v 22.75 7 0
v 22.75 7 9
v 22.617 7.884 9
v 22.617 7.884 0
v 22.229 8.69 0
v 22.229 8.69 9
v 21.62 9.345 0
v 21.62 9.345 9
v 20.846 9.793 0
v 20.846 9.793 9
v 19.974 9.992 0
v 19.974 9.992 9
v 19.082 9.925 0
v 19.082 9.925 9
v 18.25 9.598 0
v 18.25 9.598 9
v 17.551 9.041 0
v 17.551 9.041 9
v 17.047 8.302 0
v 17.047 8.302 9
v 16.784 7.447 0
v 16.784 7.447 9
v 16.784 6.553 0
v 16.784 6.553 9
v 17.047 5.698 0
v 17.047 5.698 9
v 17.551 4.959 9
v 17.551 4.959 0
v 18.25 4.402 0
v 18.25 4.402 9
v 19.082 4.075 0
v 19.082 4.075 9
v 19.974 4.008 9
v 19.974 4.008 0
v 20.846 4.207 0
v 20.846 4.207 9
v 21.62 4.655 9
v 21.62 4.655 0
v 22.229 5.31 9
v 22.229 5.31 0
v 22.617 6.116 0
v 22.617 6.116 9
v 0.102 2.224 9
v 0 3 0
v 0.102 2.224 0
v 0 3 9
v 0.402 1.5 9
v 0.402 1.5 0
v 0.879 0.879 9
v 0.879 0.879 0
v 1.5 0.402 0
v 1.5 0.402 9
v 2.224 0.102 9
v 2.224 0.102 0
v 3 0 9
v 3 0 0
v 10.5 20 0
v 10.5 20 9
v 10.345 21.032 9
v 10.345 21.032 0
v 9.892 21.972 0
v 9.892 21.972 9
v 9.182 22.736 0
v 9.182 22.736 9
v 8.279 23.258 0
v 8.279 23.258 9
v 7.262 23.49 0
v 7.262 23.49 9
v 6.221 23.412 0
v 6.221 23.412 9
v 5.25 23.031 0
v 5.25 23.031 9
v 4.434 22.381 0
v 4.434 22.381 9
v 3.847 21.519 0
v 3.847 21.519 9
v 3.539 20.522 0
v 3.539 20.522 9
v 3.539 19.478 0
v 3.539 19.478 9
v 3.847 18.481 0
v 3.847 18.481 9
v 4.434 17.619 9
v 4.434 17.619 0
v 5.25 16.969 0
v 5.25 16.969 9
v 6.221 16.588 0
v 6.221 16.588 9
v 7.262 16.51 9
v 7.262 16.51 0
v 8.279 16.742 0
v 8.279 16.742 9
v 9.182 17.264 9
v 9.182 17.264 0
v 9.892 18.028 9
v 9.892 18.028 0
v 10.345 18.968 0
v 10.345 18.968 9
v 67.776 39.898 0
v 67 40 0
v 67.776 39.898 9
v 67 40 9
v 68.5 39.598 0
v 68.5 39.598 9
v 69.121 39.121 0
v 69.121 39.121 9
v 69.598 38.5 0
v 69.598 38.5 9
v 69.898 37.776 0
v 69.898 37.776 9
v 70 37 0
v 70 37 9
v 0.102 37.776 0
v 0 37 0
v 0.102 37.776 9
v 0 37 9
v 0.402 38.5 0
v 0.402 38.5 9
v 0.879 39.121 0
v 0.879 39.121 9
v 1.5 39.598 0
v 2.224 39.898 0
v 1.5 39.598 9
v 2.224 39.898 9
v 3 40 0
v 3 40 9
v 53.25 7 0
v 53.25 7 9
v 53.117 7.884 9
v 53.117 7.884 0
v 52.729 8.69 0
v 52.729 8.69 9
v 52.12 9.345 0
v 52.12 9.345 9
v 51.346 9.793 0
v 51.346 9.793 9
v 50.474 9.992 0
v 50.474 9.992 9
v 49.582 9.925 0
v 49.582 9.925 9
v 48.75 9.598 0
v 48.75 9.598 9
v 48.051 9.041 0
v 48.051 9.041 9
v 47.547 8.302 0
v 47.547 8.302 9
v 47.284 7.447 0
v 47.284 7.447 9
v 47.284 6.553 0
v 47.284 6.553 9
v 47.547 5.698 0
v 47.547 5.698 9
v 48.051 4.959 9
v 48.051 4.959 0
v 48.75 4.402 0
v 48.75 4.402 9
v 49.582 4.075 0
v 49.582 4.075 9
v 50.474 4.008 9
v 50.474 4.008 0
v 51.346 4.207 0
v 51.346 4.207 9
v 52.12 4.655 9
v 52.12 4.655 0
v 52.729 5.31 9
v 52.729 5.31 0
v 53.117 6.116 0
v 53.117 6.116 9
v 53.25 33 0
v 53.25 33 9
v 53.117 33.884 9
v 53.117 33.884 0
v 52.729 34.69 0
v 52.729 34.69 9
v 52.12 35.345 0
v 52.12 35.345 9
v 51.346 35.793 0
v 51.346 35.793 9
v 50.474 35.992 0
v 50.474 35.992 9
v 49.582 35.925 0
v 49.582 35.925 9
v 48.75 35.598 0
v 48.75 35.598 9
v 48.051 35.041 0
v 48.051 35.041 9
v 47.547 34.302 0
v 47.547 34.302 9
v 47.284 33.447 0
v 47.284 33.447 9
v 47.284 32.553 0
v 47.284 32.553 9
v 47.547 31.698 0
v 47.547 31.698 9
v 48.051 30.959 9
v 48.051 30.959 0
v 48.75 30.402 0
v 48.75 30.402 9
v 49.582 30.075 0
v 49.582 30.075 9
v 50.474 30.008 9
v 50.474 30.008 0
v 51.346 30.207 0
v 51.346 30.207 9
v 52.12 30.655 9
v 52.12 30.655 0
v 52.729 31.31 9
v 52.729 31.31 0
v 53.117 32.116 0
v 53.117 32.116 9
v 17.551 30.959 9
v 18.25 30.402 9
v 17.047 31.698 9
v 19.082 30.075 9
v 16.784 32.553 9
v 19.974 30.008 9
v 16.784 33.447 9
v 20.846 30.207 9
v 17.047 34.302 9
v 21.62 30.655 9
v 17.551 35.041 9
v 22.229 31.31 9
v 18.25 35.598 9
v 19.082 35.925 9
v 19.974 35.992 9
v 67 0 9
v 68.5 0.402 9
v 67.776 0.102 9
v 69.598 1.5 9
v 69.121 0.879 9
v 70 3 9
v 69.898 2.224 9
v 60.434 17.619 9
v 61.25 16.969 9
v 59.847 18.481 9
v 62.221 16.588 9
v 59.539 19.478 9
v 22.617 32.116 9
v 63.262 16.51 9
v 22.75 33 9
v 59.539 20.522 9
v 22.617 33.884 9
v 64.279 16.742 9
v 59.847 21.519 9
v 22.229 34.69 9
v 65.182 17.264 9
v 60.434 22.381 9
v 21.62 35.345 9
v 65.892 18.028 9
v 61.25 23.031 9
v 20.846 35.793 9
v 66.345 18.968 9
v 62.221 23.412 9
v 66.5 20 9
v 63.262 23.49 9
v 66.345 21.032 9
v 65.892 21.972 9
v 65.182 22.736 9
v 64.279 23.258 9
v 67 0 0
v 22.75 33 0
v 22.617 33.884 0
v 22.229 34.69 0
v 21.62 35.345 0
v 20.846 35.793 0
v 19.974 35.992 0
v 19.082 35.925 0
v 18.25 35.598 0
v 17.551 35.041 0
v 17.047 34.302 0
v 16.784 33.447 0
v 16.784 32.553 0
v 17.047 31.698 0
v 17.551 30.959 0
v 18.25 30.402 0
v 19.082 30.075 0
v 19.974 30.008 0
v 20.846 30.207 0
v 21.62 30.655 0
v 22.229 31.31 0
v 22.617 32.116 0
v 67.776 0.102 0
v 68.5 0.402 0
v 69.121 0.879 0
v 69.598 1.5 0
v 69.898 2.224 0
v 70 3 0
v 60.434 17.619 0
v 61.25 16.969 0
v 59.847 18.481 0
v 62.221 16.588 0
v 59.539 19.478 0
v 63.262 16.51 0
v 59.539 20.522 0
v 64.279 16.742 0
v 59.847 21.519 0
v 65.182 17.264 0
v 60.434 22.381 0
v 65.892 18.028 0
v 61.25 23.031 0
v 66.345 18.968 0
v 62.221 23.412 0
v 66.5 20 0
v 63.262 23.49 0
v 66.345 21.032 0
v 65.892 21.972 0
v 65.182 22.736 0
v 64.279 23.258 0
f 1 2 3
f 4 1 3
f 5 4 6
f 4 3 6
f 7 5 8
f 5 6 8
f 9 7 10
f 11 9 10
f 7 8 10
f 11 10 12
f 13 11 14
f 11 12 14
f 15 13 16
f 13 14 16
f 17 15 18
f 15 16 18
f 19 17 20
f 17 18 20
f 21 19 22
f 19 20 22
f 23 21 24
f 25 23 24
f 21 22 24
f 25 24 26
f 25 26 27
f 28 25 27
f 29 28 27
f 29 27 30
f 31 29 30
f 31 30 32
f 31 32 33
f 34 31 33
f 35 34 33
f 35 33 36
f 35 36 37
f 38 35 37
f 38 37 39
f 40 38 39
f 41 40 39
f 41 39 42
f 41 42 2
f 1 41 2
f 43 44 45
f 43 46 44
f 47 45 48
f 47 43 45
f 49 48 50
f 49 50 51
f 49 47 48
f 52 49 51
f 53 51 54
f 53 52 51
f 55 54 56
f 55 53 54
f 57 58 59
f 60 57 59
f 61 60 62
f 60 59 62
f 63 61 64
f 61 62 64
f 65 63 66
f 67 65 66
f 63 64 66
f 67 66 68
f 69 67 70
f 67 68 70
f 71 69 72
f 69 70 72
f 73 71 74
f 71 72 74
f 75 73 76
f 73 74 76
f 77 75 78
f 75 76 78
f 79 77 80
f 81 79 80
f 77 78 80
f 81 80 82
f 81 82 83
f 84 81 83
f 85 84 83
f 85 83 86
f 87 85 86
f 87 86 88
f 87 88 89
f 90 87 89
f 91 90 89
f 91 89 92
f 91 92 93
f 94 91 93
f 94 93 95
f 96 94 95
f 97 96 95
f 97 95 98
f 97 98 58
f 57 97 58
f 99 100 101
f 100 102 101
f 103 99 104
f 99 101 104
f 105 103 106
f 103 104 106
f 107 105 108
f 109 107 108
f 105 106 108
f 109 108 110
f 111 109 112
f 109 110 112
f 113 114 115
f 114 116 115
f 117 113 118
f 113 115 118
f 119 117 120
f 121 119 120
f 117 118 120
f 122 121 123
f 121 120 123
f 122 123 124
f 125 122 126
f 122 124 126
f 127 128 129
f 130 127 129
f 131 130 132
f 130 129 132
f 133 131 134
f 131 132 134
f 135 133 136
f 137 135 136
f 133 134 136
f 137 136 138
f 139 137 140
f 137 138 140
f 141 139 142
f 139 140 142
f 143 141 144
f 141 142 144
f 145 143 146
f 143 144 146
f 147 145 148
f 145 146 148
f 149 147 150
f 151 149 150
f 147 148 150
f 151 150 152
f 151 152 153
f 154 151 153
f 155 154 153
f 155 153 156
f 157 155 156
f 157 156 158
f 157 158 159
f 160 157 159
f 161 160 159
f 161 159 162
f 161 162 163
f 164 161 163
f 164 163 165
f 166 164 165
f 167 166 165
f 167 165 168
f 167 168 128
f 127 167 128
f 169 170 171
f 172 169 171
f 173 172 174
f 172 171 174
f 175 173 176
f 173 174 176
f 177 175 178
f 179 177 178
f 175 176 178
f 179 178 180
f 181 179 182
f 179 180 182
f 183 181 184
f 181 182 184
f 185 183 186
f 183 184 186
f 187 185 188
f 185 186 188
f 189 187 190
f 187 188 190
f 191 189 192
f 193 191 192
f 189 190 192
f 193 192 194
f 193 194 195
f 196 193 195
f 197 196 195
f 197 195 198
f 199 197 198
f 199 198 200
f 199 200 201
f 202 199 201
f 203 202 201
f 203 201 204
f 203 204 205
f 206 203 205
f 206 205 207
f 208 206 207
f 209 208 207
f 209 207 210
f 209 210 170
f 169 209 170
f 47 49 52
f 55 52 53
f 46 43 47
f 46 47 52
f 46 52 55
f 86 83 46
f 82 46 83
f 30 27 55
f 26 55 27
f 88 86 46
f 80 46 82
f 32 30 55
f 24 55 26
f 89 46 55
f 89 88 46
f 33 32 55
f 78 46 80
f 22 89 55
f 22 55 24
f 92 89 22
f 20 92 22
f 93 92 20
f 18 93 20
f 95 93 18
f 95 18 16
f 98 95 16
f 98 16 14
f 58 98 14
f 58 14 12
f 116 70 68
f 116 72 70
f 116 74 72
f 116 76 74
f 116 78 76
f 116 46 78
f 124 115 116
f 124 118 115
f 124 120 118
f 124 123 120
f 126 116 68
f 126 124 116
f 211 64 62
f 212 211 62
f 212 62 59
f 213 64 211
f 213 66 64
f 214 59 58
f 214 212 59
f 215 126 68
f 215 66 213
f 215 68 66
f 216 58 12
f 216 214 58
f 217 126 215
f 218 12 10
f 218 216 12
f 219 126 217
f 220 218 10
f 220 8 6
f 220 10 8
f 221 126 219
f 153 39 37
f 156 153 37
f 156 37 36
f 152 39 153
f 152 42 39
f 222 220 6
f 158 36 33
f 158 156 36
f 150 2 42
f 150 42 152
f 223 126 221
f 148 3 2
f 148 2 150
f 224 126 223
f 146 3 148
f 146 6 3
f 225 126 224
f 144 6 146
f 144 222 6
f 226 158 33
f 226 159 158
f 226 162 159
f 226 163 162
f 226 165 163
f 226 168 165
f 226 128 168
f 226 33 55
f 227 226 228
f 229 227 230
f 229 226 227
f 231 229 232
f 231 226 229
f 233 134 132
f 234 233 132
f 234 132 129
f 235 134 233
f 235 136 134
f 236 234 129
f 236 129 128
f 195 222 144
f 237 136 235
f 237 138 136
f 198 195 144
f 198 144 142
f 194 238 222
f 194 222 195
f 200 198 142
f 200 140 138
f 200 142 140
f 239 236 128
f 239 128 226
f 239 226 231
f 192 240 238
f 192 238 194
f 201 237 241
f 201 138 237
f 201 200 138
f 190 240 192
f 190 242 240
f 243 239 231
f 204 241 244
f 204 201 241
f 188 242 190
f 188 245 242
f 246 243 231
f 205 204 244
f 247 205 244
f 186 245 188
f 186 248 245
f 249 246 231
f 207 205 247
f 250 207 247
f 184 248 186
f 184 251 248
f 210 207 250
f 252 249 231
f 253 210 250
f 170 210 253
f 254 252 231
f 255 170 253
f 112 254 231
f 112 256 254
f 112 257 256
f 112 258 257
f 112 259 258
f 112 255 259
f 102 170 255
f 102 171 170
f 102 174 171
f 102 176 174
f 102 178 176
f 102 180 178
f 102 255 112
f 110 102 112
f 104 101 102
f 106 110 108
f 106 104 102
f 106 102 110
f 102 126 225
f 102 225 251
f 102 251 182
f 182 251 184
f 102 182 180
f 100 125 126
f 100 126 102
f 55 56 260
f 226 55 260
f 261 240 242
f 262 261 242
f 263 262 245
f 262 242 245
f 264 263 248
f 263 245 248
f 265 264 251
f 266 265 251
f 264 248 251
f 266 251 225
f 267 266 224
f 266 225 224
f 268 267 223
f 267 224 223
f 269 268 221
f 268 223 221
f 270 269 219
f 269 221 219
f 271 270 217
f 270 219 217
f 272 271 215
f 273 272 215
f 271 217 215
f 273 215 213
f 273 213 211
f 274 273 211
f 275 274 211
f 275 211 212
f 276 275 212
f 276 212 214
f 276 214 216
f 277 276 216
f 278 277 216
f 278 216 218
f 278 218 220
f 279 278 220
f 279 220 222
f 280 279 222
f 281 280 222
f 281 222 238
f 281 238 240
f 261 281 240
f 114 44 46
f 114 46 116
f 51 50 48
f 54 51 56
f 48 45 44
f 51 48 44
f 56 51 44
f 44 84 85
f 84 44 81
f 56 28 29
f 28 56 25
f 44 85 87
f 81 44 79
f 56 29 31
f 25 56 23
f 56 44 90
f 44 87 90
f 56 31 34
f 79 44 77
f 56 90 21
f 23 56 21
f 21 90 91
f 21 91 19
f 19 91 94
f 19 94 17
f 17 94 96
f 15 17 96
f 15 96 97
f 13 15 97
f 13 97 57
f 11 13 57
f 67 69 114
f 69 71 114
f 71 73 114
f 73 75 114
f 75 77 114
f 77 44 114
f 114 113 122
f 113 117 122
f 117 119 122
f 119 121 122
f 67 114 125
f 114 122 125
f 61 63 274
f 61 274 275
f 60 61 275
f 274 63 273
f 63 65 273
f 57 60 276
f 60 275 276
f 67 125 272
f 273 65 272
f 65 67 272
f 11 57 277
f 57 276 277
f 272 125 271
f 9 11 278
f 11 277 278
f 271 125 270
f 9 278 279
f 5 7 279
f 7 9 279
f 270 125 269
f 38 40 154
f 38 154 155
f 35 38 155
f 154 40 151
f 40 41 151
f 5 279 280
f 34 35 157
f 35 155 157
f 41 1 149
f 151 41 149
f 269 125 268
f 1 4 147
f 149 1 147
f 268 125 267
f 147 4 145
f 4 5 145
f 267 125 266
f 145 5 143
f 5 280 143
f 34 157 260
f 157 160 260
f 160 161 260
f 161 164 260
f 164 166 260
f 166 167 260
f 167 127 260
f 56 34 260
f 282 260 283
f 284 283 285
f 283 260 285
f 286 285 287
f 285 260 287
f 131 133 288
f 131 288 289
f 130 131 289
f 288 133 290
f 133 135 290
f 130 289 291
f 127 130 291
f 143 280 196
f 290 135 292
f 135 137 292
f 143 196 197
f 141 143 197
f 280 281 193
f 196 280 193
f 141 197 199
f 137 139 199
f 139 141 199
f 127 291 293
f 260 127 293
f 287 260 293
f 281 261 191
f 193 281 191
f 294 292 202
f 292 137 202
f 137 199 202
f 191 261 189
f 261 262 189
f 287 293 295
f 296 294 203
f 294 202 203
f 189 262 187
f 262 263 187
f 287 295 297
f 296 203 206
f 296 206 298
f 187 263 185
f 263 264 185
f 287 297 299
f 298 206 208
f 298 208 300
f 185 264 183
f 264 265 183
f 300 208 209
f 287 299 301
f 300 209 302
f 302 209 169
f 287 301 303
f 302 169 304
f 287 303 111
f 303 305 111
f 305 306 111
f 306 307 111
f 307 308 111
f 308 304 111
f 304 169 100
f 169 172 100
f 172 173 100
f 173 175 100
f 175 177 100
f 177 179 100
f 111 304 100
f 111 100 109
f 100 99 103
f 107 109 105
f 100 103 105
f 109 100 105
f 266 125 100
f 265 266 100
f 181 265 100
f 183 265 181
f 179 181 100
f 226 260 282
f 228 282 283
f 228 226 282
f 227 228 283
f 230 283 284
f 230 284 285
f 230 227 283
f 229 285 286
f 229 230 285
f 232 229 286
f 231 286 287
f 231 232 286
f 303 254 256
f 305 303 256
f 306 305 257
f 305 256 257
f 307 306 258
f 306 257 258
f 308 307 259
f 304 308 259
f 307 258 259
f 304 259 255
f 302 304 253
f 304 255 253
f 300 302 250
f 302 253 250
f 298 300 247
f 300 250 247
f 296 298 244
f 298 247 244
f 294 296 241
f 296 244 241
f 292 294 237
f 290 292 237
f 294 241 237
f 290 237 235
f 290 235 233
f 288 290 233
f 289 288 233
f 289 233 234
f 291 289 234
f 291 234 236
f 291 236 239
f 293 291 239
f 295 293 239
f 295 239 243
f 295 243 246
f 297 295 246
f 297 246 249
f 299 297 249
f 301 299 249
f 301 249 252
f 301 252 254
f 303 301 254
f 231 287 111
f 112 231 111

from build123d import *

# Parameters (mm, degrees)
ESQUISSE1_W                  = 70
ESQUISSE1_H                  = 40
BOSS_EXTRU_1_DEPTH           = 9
ESQUISSE2_R                  = 3
ESQUISSE2_R_2                = 3.5
ENL_V_MAT_EXTRU_1_DEPTH      = 1
ENL_V_MAT_EXTRU_1_DEPTH_BACK = 10
CONG_1_R                     = 3


with BuildPart() as part:
    # Esquisse1 → Boss.-Extru.1 (new body)
    with BuildSketch(Plane.XY):
        with Locations((35, 20)):
            Rectangle(ESQUISSE1_W, ESQUISSE1_H)
    extrude(amount=BOSS_EXTRU_1_DEPTH)

    # Esquisse2 → Enlèv. mat.-Extru.1 (cut, two sides)
    with BuildSketch(Plane.XY.offset(9)) as enl_v_mat_extru_1_sk:
        with Locations((19.75, 33)):
            Circle(ESQUISSE2_R)
        with Locations((50.25, 33)):
            Circle(ESQUISSE2_R)
        with Locations((50.25, 7)):
            Circle(ESQUISSE2_R)
        with Locations((19.75, 7)):
            Circle(ESQUISSE2_R)
        with Locations((7, 20)):
            Circle(ESQUISSE2_R_2)
        with Locations((63, 20)):
            Circle(ESQUISSE2_R_2)
    extrude(amount=ENL_V_MAT_EXTRU_1_DEPTH, mode=Mode.SUBTRACT)
    extrude(enl_v_mat_extru_1_sk.sketch, amount=-ENL_V_MAT_EXTRU_1_DEPTH_BACK, mode=Mode.SUBTRACT)

    # Congé1
    cong_1_edges = [part.edges().sort_by_distance(p)[0] for p in [
        (0, 40, 4.5),
        (70, 40, 4.5),
        (70, 0, 4.5),
        (0, 0, 4.5),
    ]]
    fillet(cong_1_edges, radius=CONG_1_R)


solid = part.part
